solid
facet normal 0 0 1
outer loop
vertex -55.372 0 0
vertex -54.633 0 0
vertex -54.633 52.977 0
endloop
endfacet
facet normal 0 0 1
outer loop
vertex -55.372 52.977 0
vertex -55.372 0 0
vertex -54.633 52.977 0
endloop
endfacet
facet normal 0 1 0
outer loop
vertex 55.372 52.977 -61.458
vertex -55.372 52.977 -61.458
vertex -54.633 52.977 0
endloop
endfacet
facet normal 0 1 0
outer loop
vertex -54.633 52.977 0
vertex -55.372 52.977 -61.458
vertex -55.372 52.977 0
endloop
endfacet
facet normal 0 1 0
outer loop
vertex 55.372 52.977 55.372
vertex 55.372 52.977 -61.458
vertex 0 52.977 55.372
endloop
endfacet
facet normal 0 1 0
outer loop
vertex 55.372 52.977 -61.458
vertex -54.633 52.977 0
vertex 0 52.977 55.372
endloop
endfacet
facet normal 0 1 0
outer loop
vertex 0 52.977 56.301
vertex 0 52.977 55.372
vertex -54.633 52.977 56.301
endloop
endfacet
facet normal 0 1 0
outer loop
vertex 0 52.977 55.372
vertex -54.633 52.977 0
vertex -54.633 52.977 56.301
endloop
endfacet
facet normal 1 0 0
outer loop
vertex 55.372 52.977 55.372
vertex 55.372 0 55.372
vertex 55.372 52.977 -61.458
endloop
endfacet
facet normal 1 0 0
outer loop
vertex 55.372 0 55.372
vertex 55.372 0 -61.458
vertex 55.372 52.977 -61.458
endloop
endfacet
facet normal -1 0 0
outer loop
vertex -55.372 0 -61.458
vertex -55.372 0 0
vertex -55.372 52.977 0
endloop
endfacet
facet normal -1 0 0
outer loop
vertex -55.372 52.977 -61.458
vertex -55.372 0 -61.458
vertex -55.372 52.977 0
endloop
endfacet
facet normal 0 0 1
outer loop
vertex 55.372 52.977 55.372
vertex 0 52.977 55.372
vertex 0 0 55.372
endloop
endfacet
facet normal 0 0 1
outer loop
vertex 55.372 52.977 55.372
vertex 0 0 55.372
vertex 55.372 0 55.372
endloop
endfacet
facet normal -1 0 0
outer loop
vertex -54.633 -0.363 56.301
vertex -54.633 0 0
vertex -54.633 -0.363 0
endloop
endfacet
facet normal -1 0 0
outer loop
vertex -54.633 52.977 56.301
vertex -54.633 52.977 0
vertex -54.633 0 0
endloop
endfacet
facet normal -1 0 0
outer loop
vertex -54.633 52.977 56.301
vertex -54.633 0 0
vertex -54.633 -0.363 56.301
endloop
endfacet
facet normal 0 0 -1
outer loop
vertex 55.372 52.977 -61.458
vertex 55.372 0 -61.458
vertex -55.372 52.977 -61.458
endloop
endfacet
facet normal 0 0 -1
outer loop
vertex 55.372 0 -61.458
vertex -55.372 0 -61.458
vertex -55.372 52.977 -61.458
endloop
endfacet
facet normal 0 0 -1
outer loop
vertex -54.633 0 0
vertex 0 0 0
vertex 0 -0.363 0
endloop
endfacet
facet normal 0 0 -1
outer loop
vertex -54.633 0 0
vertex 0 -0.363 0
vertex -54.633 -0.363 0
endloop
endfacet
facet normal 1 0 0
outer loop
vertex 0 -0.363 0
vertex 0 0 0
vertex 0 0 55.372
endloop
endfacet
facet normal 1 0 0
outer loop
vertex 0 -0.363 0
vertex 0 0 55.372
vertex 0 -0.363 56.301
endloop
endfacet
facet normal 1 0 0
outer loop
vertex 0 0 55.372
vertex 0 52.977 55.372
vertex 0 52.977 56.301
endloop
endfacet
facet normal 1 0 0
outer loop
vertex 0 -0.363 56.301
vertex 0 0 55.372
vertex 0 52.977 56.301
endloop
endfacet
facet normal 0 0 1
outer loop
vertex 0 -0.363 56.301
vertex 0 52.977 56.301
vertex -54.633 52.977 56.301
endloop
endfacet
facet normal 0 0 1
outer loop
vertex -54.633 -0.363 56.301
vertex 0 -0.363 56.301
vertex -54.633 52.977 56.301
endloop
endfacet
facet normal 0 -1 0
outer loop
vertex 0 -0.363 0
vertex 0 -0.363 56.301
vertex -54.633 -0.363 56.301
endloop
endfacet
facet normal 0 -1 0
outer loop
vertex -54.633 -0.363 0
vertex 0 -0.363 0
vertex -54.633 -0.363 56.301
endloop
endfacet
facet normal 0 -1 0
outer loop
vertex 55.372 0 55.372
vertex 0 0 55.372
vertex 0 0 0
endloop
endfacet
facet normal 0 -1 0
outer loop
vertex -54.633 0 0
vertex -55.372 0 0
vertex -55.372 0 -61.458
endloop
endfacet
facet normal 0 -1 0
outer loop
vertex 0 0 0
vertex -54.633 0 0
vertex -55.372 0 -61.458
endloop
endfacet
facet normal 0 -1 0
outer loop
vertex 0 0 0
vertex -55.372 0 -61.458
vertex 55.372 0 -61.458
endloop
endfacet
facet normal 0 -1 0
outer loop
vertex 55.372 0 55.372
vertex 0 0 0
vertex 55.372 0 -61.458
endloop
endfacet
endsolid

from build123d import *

# Parameters (mm, degrees)
F0_W     = 52.9774986207
F0_H     = 61.4581517875
F1_DEPTH = 55.372
F2_W     = 54.633140564
F2_H     = 56.3007220626
F3_DEPTH = 53.34
F4_W     = 52.9774986207
F4_H     = 61.4581517875
F5_DEPTH = 55.372
F6_W     = 55.372
F6_H     = 52.9774986207
F7_DEPTH = 55.372


with BuildPart() as f1:
    # F0 (on Right) → F1 (new body)
    with BuildSketch(Plane.YZ):
        with Locations((26.4887493104, -30.7290758938)):
            Rectangle(F0_W, F0_H)
    extrude(amount=-F1_DEPTH)

    # F2 (on face) → F3 (join)
    with BuildSketch(Plane(origin=(0, 52.9774986207, 0), x_dir=(-1, 0, 0), z_dir=(0, 1, 0))):
        with Locations((27.316570282, 28.1503610313)):
            Rectangle(F2_W, F2_H)
    extrude(amount=-F3_DEPTH)

    # F4 (on face) → F5 (join)
    with BuildSketch(Plane.YZ):
        with Locations((26.4887493104, -30.7290758938)):
            Rectangle(F4_W, F4_H)
    extrude(amount=F5_DEPTH)

    # F6 (on face) → F7 (join)
    with BuildSketch(Plane.XY):
        with Locations((27.686, 26.4887493104)):
            Rectangle(F6_W, F6_H)
    extrude(amount=F7_DEPTH)


solid = f1.part
